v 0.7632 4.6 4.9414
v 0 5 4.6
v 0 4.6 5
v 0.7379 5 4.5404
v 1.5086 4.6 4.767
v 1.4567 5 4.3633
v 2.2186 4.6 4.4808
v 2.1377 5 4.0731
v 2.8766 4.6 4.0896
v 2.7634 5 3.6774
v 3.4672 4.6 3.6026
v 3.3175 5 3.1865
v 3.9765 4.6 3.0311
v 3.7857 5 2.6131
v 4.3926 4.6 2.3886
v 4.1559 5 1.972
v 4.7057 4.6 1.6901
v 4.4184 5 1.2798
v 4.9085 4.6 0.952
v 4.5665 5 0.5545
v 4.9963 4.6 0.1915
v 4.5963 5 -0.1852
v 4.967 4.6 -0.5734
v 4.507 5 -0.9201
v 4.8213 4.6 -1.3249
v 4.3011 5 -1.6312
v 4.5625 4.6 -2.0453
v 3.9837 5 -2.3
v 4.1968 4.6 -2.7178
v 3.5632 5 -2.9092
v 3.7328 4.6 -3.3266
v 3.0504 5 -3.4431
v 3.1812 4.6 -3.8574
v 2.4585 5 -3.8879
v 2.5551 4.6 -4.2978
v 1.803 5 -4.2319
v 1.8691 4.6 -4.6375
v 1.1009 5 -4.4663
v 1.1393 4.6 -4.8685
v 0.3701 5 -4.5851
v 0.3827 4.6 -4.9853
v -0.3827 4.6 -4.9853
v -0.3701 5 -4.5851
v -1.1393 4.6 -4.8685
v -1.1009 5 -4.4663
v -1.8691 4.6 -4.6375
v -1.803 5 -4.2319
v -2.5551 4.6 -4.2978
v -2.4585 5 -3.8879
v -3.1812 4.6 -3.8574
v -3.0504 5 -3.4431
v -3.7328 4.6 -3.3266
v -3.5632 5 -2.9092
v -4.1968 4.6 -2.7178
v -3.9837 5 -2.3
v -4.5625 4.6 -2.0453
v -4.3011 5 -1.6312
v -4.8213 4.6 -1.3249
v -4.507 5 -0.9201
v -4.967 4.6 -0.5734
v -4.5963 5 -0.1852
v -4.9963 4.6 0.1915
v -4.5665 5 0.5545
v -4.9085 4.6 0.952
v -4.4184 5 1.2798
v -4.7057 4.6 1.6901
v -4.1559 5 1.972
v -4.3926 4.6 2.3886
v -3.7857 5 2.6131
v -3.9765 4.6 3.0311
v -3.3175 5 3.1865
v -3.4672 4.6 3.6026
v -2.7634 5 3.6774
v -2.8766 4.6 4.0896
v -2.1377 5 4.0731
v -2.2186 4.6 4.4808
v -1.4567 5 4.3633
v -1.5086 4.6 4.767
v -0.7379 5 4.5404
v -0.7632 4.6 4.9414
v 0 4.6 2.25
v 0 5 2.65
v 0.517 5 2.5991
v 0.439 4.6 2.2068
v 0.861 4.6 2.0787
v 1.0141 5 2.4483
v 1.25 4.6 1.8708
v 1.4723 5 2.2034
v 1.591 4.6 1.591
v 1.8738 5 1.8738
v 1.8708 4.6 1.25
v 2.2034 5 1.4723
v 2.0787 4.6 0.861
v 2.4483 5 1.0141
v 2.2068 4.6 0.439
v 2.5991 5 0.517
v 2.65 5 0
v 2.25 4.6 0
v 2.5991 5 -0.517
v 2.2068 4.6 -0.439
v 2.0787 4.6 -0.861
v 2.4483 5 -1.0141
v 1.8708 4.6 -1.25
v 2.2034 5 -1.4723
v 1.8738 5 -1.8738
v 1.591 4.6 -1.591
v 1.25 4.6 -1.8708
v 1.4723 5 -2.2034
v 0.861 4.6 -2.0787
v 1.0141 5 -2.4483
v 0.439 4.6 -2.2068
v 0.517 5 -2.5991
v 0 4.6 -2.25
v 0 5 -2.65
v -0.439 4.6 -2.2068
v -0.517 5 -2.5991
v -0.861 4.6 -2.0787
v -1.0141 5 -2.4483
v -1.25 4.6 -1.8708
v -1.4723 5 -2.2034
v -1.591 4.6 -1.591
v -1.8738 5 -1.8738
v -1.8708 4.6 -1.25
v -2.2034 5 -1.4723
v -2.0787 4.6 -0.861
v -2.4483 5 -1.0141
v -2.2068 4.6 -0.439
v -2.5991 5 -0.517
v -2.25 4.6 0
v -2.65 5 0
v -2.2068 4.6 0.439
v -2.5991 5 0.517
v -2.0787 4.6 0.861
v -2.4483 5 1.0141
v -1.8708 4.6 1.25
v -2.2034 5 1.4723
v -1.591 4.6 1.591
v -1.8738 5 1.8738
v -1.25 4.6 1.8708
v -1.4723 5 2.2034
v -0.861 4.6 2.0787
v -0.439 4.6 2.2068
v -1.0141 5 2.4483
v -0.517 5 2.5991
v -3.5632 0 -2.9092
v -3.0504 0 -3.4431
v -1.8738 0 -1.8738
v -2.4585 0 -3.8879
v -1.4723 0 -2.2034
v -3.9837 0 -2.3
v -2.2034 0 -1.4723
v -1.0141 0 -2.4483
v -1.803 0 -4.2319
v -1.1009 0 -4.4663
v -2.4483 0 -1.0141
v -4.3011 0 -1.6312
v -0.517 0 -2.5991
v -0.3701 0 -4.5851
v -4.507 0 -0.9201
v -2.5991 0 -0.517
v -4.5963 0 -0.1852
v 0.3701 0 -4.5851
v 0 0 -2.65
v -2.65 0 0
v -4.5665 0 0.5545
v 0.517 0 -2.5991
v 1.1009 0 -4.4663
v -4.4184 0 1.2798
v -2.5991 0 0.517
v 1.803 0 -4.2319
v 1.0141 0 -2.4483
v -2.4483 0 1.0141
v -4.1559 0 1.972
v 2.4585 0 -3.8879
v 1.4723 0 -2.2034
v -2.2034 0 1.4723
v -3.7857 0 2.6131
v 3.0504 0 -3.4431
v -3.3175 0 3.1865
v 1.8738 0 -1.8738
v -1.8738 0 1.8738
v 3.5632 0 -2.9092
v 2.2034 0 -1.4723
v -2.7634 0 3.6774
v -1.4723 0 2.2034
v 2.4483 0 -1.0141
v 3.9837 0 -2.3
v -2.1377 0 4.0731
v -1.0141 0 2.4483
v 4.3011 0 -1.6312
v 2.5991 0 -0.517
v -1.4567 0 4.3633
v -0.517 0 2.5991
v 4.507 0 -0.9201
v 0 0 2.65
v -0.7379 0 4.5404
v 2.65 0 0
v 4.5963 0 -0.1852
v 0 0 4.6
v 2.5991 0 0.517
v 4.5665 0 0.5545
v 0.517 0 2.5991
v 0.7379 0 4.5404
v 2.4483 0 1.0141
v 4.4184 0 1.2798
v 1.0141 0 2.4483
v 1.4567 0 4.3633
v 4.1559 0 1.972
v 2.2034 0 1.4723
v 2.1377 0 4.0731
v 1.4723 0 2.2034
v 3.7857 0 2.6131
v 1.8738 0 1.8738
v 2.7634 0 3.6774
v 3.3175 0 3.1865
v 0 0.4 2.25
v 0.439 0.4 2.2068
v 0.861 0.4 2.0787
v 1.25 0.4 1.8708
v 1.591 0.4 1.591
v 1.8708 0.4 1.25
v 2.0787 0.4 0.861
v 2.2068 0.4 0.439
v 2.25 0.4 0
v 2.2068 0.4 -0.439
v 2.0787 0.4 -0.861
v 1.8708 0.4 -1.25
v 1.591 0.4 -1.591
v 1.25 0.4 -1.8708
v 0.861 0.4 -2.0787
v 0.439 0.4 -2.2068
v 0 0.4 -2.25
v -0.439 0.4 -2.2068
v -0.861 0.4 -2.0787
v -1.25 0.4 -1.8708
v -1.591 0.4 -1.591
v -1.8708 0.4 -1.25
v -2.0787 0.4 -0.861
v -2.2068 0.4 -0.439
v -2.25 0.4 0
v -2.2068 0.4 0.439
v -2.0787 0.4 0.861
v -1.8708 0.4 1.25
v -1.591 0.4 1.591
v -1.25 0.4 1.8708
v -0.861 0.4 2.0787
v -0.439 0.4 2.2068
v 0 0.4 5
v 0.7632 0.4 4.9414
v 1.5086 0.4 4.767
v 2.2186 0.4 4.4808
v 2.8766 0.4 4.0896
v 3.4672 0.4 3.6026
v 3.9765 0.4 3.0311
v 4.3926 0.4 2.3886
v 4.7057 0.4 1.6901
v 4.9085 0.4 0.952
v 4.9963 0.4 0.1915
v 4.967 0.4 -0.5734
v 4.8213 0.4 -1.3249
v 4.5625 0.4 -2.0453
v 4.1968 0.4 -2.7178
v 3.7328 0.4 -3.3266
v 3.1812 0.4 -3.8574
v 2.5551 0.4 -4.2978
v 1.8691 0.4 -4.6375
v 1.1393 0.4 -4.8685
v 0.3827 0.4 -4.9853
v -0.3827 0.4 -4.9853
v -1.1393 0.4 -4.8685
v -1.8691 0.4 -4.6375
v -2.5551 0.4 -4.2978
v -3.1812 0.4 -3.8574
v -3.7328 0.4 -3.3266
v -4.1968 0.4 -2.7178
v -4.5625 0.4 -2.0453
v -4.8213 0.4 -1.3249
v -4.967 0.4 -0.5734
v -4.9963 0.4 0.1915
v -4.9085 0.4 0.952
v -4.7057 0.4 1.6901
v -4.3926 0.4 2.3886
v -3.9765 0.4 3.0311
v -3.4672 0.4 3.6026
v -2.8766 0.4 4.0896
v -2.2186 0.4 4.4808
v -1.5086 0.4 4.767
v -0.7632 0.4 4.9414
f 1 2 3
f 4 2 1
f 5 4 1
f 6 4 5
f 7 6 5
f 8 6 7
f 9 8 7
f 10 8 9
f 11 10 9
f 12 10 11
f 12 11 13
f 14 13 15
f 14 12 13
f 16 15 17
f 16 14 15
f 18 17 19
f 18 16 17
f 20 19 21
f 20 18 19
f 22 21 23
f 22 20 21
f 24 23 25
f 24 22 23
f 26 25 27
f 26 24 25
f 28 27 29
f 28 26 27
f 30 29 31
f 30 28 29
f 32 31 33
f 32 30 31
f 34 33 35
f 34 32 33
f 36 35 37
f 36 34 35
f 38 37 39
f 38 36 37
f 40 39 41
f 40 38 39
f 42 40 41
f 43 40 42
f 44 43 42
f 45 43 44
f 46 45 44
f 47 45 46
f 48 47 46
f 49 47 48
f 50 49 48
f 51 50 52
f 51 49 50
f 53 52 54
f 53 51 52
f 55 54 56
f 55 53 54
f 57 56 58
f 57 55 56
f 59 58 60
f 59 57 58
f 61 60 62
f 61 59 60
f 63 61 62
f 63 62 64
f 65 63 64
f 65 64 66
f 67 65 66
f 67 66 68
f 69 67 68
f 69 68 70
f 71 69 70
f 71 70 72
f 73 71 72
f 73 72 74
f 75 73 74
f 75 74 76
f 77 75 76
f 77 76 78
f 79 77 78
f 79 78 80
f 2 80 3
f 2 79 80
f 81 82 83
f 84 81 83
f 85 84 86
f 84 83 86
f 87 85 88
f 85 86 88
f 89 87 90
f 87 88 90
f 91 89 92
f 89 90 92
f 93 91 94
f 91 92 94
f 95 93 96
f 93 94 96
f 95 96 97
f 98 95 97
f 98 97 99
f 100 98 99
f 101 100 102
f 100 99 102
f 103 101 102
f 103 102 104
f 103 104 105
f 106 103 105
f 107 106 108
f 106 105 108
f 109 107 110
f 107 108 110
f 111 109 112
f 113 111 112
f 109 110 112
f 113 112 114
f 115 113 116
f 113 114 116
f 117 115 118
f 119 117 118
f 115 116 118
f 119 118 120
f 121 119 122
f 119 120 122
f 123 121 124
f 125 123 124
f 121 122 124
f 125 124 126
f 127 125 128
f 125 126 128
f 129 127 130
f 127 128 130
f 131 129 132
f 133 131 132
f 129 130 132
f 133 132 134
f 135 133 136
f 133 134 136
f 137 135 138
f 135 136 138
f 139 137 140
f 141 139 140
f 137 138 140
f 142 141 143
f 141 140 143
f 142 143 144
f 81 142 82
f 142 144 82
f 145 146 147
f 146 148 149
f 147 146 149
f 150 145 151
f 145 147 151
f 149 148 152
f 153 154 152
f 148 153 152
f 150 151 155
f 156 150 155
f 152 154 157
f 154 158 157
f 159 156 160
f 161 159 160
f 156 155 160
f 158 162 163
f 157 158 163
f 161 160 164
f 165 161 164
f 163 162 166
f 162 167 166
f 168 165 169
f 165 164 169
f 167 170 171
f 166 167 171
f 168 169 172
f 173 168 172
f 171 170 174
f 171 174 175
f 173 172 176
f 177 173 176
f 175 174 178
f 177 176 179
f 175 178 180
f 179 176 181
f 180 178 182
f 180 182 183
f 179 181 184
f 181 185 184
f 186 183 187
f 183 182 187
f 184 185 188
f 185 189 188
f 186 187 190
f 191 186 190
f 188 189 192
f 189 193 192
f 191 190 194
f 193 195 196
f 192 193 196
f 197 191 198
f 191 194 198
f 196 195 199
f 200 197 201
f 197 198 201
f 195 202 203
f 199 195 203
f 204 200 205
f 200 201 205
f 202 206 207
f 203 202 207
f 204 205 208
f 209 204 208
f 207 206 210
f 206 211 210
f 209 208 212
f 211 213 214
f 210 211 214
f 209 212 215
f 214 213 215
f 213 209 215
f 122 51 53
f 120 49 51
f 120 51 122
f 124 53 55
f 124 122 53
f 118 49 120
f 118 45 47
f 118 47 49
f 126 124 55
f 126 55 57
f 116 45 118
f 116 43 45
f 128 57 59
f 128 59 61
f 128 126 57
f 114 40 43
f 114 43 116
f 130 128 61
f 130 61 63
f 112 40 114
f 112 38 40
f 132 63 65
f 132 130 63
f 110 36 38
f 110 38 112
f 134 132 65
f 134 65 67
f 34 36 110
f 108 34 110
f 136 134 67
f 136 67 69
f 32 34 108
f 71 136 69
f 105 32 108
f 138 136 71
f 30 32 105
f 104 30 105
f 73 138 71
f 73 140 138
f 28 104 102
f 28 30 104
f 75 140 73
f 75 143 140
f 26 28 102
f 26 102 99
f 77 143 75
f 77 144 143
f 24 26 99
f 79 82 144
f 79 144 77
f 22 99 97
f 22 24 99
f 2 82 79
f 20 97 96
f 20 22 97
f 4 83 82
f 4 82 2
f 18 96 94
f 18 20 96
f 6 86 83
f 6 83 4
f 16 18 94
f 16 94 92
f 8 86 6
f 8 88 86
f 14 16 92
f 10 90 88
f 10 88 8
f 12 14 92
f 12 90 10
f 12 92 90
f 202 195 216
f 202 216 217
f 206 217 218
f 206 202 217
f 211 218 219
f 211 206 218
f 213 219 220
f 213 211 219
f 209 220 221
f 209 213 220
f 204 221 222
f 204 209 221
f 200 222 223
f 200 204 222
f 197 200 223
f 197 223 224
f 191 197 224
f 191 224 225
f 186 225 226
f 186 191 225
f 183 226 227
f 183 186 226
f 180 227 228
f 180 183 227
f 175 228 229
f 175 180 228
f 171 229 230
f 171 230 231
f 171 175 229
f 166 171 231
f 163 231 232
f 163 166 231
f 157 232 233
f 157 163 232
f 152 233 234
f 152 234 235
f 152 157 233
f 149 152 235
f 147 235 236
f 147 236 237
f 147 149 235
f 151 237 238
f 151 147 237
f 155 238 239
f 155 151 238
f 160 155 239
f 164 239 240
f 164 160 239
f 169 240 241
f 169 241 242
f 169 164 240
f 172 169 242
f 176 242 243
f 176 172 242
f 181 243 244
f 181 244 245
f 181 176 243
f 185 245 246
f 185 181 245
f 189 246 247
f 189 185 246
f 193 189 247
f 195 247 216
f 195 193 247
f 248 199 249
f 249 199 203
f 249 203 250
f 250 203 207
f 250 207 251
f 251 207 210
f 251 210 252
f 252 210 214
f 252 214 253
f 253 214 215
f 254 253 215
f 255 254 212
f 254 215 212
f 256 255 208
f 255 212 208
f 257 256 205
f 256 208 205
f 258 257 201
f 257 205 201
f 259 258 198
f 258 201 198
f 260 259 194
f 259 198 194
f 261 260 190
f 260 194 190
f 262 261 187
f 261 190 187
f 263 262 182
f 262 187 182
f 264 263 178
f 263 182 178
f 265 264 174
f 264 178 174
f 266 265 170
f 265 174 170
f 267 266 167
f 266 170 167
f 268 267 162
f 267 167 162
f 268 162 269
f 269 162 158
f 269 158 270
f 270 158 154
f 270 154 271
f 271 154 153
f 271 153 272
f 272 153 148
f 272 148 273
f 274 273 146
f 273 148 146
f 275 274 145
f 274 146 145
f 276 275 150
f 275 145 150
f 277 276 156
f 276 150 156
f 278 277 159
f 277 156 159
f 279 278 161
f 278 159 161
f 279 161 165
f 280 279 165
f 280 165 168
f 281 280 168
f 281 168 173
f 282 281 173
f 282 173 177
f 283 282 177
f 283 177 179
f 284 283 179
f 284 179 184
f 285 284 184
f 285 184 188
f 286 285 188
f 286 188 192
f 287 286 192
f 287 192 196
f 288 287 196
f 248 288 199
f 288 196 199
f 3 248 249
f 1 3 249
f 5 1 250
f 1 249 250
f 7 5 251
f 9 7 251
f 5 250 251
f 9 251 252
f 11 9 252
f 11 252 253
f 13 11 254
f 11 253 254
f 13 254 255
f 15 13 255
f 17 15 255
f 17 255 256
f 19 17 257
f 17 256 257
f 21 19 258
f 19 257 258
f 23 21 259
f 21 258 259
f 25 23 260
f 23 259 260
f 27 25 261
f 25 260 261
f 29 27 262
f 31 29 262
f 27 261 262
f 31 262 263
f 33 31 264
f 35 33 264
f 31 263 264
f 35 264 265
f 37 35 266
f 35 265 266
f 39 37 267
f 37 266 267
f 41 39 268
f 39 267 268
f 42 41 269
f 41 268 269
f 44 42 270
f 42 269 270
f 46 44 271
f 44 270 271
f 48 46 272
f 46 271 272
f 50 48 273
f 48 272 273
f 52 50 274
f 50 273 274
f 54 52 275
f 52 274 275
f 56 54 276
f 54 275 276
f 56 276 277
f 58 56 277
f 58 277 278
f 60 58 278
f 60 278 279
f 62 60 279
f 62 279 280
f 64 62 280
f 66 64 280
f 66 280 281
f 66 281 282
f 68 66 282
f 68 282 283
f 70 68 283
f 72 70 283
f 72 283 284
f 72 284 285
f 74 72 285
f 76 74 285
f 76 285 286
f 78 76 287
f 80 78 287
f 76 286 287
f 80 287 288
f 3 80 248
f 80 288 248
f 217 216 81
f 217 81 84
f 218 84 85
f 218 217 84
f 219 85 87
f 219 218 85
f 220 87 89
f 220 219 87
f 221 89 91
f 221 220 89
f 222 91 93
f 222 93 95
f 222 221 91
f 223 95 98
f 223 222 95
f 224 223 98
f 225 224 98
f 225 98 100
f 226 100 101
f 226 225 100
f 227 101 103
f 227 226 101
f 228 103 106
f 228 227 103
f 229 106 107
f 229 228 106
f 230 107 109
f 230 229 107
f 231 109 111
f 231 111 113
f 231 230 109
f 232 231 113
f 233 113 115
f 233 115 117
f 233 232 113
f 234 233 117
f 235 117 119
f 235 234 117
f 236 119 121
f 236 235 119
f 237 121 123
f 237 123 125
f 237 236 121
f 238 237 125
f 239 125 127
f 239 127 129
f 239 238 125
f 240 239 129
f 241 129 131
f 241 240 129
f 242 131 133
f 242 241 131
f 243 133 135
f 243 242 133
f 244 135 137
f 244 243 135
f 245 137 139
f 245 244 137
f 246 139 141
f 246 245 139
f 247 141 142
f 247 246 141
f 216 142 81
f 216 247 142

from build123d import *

# Parameters (mm, degrees)
BODY_SKETCH_R   = 5
BODY_SKETCH_R_2 = 2.25
BODY_DEPTH      = 5
CHAMFERS_SIZE   = 0.4


with BuildPart() as part:
    # body_sketch → body (new body)
    with BuildSketch(Plane(origin=(0, 0, 0), x_dir=(1, 0, 0), z_dir=(0, 1, 0))):
        with Locations(Location((0, 0, 0), (0, 0, 270))):
            Circle(BODY_SKETCH_R)
        with Locations(Location((0, 0, 0), (0, 0, 270))):
            Circle(BODY_SKETCH_R_2, mode=Mode.SUBTRACT)
    extrude(amount=BODY_DEPTH)

    # chamfers
    chamfers_edges = [part.edges().sort_by_distance(p)[0] for p in [
        (0, 0, -5),
        (0, 5, -5),
        (0, 0, -2.25),
        (0, 5, -2.25),
    ]]
    chamfer(chamfers_edges, length=CHAMFERS_SIZE)


solid = part.part
